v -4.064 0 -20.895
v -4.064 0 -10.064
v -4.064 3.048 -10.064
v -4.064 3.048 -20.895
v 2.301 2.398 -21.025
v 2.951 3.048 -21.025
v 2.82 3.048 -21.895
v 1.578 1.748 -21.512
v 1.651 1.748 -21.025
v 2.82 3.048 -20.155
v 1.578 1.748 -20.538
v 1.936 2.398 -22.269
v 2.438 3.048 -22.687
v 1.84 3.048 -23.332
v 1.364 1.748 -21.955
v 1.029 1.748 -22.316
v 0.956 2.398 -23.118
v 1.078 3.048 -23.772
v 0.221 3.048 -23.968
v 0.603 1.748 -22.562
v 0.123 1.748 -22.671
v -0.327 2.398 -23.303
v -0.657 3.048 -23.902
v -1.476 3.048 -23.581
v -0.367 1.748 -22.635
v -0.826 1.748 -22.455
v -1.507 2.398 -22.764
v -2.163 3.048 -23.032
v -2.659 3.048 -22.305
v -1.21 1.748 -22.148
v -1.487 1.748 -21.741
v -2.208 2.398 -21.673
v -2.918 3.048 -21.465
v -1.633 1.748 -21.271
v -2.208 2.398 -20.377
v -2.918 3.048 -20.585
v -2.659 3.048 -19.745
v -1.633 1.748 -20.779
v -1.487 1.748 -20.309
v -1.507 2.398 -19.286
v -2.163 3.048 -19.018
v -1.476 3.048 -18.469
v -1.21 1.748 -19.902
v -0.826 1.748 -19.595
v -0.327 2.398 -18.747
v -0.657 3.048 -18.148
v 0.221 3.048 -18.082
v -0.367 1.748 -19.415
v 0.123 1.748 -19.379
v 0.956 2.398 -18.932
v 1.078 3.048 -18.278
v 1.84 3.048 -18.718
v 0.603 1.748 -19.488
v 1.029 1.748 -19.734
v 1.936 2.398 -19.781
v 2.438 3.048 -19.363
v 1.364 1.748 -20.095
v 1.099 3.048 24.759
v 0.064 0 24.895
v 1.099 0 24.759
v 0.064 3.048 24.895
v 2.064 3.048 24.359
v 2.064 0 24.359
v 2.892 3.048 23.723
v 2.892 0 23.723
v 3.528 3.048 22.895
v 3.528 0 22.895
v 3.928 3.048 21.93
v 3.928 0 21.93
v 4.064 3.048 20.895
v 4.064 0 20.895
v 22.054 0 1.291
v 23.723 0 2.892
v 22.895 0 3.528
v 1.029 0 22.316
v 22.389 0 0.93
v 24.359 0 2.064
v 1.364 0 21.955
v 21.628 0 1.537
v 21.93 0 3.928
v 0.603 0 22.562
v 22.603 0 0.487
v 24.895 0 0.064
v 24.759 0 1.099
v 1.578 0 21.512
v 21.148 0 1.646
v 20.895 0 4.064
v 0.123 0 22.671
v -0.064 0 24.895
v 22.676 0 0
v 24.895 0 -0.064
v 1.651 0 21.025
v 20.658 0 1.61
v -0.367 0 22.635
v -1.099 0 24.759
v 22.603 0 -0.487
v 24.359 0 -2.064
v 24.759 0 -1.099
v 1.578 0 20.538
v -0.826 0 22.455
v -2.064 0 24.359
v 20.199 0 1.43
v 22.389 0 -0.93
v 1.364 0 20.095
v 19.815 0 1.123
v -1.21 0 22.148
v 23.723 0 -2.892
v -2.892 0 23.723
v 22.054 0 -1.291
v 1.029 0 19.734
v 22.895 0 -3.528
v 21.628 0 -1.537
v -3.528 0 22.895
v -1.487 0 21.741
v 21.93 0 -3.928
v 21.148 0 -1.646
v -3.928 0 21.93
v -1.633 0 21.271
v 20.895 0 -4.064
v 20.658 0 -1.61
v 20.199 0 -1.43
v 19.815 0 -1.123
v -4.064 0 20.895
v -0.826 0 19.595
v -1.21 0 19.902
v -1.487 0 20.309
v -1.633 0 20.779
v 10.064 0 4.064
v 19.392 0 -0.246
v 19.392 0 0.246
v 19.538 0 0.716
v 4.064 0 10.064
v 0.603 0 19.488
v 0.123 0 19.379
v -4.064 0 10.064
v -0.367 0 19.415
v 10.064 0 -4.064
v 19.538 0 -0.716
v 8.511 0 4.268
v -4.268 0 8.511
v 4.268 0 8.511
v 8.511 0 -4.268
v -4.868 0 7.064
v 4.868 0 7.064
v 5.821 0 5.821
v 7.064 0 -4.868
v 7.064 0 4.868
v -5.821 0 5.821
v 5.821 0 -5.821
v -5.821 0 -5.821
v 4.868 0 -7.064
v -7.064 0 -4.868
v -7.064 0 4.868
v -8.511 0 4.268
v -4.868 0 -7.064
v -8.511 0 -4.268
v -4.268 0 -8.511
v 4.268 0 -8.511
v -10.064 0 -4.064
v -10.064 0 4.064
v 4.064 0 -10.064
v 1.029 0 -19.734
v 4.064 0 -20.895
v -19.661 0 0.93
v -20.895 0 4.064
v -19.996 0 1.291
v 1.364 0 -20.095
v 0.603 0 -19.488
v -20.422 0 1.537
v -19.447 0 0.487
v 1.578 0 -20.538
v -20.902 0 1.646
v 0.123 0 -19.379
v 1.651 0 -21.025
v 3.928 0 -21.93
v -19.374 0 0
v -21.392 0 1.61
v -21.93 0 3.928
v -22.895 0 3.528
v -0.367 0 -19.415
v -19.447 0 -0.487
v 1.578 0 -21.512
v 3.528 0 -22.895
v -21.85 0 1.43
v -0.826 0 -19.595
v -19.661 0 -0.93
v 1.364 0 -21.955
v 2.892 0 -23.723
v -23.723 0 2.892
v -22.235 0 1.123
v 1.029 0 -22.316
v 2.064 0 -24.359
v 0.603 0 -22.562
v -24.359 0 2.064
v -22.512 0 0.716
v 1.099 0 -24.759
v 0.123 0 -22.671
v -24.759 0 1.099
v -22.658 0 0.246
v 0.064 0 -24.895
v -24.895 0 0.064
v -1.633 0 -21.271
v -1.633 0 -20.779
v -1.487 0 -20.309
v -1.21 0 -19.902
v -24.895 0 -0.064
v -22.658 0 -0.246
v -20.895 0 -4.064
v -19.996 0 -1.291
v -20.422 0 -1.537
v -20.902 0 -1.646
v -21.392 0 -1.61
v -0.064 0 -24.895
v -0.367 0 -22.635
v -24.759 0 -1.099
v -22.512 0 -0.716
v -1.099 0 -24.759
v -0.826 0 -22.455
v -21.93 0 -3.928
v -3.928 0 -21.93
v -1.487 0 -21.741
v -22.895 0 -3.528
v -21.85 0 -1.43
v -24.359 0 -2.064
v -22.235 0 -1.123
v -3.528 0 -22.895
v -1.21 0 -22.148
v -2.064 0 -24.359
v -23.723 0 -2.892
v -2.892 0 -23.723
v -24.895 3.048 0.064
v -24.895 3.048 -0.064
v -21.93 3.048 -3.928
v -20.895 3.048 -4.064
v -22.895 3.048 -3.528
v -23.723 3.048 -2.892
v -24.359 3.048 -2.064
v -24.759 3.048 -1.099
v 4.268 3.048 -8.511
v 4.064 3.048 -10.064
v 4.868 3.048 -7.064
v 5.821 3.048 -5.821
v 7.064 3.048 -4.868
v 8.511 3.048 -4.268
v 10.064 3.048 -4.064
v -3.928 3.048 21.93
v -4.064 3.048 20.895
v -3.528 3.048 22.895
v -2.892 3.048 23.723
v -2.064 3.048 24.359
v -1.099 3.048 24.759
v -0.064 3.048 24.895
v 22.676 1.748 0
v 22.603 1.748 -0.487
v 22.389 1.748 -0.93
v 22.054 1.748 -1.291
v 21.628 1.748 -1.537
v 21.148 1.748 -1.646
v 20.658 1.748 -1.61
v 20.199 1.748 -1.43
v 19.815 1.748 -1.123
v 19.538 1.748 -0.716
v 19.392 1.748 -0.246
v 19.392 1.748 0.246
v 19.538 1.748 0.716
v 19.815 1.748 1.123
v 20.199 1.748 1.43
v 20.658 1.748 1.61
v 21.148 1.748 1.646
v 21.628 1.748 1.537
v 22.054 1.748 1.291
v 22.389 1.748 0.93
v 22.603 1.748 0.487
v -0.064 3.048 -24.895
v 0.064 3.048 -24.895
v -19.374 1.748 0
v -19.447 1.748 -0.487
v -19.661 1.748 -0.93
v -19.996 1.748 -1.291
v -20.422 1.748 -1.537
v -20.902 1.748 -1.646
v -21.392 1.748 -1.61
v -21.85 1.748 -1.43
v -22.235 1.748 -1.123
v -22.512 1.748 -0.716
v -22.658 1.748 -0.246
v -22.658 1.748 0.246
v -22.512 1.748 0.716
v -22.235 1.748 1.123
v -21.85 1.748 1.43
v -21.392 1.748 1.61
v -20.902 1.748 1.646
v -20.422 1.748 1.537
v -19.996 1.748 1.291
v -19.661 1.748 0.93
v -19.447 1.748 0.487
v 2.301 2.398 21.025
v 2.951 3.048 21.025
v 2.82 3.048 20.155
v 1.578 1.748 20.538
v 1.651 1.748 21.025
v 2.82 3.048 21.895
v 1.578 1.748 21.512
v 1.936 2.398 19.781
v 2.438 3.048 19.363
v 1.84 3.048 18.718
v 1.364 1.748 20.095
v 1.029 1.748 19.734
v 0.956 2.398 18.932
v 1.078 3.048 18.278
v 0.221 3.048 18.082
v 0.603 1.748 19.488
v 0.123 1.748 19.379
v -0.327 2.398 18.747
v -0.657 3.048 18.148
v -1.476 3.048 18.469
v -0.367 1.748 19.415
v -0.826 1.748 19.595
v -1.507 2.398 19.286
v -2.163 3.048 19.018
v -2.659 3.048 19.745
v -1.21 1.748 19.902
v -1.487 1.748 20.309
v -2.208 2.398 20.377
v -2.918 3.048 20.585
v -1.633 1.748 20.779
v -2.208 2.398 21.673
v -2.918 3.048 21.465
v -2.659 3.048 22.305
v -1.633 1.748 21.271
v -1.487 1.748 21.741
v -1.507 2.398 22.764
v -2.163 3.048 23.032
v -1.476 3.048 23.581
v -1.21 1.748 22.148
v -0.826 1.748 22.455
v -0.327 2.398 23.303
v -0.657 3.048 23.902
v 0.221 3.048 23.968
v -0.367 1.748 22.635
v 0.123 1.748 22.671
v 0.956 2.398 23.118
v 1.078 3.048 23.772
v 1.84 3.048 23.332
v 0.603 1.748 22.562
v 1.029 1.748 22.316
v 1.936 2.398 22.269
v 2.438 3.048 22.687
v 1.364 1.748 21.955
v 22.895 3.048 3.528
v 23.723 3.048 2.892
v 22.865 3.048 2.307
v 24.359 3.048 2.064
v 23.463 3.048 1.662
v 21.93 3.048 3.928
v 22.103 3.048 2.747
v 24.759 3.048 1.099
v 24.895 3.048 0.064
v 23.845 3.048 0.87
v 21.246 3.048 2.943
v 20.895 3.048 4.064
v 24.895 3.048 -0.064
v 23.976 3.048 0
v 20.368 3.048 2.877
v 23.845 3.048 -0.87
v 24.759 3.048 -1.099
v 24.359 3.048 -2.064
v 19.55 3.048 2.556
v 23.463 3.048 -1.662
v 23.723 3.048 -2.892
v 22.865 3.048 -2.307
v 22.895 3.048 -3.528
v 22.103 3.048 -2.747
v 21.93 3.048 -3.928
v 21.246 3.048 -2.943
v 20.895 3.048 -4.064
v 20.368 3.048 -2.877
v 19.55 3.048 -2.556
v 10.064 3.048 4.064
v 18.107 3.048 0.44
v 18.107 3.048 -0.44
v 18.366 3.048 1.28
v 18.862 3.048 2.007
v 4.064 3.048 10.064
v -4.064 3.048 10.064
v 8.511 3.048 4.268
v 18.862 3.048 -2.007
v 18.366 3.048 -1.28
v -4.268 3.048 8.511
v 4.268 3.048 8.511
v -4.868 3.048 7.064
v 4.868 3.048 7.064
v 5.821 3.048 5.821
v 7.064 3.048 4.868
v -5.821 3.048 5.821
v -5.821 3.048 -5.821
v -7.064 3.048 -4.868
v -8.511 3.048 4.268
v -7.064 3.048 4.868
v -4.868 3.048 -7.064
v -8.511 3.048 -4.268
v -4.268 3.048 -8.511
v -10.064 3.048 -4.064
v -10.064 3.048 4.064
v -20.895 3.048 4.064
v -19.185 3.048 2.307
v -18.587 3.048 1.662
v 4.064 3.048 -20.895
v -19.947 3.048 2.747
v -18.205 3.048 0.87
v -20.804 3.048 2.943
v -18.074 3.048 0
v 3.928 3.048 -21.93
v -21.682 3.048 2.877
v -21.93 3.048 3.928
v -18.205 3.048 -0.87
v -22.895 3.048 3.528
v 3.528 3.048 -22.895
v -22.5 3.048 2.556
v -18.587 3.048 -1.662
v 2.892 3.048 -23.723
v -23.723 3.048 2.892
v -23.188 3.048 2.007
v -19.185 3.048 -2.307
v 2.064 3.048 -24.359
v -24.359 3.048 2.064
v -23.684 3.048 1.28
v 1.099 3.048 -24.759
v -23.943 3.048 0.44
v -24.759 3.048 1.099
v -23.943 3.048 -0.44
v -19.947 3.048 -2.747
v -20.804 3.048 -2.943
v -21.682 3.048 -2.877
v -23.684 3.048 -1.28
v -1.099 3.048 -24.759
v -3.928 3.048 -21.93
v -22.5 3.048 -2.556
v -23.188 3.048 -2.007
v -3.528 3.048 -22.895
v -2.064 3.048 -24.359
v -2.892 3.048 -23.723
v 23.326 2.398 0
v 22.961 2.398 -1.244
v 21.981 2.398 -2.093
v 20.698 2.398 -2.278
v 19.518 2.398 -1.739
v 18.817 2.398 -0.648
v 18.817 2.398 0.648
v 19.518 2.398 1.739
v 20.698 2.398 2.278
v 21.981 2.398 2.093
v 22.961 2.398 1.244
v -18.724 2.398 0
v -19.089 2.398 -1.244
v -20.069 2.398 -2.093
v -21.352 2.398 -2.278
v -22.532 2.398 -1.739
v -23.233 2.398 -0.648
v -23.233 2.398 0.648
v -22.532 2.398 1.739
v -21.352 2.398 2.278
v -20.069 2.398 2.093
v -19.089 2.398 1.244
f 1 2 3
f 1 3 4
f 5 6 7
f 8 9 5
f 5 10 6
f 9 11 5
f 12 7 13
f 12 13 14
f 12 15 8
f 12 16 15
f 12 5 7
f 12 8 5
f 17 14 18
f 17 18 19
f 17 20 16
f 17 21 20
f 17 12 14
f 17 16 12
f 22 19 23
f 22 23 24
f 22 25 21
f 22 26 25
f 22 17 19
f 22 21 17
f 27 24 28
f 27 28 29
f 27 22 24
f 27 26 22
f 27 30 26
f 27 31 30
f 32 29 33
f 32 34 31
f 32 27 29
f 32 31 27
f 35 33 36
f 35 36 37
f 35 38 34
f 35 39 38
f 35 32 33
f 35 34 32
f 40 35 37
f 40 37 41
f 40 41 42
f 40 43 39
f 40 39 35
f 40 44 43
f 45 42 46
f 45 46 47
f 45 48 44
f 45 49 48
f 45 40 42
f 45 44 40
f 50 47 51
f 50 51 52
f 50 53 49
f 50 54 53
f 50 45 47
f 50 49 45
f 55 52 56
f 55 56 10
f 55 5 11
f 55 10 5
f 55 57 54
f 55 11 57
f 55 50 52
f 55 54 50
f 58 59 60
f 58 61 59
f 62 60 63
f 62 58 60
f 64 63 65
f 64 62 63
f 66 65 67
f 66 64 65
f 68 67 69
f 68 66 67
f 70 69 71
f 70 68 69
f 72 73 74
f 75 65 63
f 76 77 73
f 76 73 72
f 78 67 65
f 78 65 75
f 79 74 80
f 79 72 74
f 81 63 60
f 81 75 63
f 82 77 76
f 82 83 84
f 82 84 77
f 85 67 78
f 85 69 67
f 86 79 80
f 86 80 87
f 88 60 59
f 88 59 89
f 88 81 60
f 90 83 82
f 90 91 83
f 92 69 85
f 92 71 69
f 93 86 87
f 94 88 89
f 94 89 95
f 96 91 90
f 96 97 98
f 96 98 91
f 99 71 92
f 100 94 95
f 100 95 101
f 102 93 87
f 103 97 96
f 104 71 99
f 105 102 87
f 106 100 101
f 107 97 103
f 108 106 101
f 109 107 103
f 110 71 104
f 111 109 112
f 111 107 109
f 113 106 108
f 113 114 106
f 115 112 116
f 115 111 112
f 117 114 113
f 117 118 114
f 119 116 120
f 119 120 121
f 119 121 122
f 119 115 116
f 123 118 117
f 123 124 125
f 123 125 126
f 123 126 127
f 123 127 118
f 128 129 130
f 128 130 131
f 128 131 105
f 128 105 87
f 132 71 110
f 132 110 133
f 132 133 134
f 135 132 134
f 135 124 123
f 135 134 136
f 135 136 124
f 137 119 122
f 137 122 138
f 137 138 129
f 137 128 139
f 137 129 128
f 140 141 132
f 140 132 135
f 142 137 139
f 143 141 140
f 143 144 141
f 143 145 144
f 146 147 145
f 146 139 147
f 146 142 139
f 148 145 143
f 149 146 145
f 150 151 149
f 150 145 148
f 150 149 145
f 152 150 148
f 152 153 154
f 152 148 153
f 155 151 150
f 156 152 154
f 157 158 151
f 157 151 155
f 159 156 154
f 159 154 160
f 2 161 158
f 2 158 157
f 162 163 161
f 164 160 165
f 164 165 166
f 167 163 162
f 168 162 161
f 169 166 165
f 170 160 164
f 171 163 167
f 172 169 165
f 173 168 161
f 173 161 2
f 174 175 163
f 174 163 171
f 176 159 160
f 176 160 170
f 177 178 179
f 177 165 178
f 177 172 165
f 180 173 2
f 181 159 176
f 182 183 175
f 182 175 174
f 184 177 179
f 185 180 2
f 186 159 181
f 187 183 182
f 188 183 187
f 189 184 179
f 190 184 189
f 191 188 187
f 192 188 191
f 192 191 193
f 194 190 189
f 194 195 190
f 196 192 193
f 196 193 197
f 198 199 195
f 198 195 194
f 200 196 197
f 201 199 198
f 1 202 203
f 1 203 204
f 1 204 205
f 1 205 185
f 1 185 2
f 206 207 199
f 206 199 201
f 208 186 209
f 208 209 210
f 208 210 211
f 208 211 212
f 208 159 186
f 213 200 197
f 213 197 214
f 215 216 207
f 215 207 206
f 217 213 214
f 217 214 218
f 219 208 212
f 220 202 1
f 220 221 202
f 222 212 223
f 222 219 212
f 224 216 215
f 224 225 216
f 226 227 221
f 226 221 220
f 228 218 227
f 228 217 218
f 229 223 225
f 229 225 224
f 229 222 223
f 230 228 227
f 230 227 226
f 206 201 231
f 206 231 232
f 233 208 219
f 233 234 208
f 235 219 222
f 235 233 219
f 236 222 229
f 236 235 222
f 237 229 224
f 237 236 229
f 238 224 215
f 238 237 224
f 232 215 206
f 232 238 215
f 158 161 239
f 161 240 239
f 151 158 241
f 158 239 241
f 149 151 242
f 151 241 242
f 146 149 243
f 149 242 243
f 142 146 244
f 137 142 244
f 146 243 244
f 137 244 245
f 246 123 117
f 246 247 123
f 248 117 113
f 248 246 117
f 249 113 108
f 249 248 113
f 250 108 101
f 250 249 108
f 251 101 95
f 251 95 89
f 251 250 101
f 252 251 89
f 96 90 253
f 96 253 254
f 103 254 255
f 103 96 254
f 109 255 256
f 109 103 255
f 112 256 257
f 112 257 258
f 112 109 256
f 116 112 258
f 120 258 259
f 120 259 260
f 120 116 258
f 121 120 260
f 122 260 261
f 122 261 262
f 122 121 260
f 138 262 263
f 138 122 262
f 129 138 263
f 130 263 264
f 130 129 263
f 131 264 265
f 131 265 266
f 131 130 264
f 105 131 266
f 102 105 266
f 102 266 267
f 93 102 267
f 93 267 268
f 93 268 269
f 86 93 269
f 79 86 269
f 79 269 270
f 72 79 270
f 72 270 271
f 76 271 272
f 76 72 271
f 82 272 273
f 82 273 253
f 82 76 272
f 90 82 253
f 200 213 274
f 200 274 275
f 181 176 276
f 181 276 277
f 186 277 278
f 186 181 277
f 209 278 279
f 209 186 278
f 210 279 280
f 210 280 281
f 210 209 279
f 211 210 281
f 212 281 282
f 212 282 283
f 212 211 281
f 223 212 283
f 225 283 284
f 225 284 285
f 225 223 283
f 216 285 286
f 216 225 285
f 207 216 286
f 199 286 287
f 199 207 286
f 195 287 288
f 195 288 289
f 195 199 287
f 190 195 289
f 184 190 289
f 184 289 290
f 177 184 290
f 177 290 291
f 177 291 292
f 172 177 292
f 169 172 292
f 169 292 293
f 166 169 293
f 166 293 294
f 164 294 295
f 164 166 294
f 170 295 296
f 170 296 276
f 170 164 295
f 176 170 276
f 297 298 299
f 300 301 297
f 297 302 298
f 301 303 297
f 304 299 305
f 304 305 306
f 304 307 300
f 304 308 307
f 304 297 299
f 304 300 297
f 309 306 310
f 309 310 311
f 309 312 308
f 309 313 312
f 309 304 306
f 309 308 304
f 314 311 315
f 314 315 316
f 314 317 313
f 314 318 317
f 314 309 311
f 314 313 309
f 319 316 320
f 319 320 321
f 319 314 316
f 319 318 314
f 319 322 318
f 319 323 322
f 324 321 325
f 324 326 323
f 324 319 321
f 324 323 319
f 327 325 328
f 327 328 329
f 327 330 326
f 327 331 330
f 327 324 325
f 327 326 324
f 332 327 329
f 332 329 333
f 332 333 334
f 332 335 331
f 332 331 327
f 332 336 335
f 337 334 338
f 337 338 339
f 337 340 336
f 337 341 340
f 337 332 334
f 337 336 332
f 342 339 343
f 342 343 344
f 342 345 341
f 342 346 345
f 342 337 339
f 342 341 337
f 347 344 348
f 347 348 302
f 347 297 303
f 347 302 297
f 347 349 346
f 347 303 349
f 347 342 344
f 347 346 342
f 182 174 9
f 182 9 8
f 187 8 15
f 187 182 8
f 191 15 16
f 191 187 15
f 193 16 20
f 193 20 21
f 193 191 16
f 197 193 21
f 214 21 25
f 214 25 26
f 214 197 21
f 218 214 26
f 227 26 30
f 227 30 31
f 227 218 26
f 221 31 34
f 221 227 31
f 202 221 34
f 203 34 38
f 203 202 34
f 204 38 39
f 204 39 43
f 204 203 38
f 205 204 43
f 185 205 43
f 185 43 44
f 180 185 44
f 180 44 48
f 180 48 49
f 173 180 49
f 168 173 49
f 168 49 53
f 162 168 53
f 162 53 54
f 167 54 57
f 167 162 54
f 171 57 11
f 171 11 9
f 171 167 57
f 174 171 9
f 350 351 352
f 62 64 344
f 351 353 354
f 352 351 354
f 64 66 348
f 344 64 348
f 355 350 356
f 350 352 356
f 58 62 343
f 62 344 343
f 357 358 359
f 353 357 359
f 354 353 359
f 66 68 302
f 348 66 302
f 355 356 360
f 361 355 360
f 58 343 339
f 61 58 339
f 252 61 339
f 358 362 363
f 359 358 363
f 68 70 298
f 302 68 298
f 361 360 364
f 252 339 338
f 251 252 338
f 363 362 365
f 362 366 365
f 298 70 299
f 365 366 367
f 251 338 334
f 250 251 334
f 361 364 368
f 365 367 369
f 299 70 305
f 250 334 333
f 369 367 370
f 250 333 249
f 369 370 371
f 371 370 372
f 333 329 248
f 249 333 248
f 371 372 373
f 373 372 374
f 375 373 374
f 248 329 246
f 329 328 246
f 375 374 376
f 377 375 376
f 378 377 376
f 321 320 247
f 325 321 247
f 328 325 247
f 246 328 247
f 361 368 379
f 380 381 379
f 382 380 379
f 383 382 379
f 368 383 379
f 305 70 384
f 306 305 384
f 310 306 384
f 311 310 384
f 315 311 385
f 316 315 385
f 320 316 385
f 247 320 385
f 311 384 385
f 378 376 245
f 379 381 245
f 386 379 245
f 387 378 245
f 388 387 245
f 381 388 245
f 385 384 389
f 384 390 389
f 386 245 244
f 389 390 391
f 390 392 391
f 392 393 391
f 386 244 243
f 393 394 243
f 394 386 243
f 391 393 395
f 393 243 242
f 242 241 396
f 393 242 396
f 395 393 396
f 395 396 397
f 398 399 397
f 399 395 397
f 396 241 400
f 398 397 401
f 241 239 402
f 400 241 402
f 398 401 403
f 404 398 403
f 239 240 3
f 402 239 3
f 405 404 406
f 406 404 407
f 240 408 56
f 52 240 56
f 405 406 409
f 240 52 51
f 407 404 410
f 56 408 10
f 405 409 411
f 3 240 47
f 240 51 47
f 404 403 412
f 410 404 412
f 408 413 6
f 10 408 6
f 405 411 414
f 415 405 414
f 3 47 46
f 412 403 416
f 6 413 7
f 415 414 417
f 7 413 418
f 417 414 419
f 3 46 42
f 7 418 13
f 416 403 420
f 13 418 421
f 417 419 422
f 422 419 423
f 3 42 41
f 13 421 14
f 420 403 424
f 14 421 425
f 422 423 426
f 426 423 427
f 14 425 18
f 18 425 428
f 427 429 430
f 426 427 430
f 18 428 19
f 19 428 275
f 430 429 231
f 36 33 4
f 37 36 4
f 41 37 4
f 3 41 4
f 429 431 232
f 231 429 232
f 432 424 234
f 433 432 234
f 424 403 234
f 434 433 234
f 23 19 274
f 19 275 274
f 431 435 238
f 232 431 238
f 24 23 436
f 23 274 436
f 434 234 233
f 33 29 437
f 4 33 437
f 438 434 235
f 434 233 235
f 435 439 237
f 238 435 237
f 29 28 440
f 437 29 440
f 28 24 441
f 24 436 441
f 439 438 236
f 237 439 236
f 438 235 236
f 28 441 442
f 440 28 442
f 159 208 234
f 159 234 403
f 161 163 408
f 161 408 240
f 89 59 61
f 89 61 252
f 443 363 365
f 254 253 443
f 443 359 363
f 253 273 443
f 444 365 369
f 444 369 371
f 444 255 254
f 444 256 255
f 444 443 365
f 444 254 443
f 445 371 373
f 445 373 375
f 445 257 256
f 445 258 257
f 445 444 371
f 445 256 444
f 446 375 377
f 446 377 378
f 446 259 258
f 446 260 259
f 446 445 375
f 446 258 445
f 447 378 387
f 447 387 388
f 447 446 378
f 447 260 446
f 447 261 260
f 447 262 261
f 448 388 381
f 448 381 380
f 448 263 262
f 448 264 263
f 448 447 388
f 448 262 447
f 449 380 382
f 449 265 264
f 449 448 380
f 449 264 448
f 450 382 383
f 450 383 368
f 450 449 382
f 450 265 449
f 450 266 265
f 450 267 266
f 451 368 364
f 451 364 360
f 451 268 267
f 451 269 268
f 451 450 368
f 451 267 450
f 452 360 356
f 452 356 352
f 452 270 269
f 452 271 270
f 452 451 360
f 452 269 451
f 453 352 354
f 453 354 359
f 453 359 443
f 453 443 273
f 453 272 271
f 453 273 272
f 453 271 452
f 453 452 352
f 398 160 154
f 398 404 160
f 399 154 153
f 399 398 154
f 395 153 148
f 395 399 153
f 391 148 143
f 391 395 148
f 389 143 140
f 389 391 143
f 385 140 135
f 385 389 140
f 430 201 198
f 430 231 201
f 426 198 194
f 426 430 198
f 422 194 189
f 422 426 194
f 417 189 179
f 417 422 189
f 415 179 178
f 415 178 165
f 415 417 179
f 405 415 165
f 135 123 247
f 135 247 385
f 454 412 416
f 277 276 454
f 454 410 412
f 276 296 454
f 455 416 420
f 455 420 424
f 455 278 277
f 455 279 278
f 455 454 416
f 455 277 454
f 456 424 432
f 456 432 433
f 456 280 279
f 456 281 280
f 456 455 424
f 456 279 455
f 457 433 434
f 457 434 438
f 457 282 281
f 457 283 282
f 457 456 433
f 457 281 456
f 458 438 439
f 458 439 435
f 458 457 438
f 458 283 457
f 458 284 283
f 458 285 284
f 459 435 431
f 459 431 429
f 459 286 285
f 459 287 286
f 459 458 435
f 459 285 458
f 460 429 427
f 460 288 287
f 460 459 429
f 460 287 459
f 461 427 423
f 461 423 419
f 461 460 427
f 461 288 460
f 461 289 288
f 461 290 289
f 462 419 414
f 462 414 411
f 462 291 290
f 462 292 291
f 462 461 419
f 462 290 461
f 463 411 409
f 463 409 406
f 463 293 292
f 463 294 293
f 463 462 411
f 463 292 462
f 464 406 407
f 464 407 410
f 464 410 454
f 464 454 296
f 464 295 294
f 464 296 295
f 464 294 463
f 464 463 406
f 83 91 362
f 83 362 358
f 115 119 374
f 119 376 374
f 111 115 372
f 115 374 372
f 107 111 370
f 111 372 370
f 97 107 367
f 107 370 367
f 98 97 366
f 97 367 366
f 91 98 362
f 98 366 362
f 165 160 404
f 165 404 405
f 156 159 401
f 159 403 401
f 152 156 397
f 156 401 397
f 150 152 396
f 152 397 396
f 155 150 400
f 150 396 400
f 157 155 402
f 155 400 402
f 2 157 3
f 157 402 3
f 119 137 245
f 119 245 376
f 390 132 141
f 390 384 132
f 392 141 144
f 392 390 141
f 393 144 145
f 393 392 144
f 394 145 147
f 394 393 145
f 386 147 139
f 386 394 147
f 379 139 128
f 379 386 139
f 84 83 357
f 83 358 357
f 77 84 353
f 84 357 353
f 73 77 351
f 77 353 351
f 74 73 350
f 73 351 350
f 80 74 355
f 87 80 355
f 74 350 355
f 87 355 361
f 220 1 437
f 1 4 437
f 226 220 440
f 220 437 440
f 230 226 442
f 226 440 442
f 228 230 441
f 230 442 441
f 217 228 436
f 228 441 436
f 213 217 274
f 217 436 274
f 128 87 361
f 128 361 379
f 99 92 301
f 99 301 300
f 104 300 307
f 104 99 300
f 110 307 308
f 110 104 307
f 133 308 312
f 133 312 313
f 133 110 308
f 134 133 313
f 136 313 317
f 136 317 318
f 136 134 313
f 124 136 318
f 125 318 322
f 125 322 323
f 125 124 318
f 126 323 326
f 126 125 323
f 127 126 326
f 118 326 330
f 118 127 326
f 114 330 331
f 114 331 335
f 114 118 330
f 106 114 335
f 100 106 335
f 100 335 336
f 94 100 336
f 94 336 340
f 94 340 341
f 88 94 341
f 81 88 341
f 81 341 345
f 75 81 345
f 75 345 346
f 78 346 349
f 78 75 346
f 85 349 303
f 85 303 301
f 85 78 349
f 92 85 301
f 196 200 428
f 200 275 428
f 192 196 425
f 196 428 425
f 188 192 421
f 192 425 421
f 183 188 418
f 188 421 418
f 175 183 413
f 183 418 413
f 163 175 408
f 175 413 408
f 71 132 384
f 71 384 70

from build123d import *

# Parameters (mm, degrees)
SKETCH1_R           = 1.651
BOSS_EXTRUDE1_DEPTH = 3.048
FILLET3_R           = 4
CHAMFER1_SIZE       = 1.3
FILLET4_R           = 6


with BuildPart() as part:
    # Sketch1 → Boss-Extrude1 (new body)
    with BuildSketch(Plane(origin=(0, 0, 0), x_dir=(1, 0, 0), z_dir=(0, 1, 0))):
        Polygon((-24.895, 4.064), (-4.064, 4.064), (-4.064, 24.895), (4.064, 24.895), (4.064, 4.064), (24.895, 4.064), (24.895, -4.064), (4.064, -4.064), (4.064, -24.895), (-4.064, -24.895), (-4.064, -4.064), (-24.895, -4.064), align=None)
        with Locations((21.025, 0)):
            Circle(SKETCH1_R, mode=Mode.SUBTRACT)
        with Locations((0, 21.025)):
            Circle(SKETCH1_R, mode=Mode.SUBTRACT)
        with Locations((-21.025, 0)):
            Circle(SKETCH1_R, mode=Mode.SUBTRACT)
        with Locations((0, -21.025)):
            Circle(SKETCH1_R, mode=Mode.SUBTRACT)
    extrude(amount=BOSS_EXTRUDE1_DEPTH)

    # Fillet3
    fillet3_edges = [part.edges().sort_by_distance(p)[0] for p in [
        (4.064, 1.524, 24.895),
        (-4.064, 1.524, 24.895),
        (-24.895, 1.524, 4.064),
        (-24.895, 1.524, -4.064),
        (-4.064, 1.524, -24.895),
        (4.064, 1.524, -24.895),
        (24.895, 1.524, -4.064),
        (24.895, 1.524, 4.064),
    ]]
    fillet(fillet3_edges, radius=FILLET3_R)

    # Chamfer1
    chamfer1_edges = [part.edges().sort_by_distance(p)[0] for p in [
        (19.374, 3.048, 0),
        (-1.651, 3.048, -21.025),
        (-22.676, 3.048, 0),
        (-1.651, 3.048, 21.025),
    ]]
    chamfer(chamfer1_edges, length=CHAMFER1_SIZE)

    # Fillet4
    fillet4_edges = [part.edges().sort_by_distance(p)[0] for p in [
        (4.064, 1.524, 4.064),
        (-4.064, 1.524, 4.064),
        (-4.064, 1.524, -4.064),
        (4.064, 1.524, -4.064),
    ]]
    fillet(fillet4_edges, radius=FILLET4_R)


solid = part.part
